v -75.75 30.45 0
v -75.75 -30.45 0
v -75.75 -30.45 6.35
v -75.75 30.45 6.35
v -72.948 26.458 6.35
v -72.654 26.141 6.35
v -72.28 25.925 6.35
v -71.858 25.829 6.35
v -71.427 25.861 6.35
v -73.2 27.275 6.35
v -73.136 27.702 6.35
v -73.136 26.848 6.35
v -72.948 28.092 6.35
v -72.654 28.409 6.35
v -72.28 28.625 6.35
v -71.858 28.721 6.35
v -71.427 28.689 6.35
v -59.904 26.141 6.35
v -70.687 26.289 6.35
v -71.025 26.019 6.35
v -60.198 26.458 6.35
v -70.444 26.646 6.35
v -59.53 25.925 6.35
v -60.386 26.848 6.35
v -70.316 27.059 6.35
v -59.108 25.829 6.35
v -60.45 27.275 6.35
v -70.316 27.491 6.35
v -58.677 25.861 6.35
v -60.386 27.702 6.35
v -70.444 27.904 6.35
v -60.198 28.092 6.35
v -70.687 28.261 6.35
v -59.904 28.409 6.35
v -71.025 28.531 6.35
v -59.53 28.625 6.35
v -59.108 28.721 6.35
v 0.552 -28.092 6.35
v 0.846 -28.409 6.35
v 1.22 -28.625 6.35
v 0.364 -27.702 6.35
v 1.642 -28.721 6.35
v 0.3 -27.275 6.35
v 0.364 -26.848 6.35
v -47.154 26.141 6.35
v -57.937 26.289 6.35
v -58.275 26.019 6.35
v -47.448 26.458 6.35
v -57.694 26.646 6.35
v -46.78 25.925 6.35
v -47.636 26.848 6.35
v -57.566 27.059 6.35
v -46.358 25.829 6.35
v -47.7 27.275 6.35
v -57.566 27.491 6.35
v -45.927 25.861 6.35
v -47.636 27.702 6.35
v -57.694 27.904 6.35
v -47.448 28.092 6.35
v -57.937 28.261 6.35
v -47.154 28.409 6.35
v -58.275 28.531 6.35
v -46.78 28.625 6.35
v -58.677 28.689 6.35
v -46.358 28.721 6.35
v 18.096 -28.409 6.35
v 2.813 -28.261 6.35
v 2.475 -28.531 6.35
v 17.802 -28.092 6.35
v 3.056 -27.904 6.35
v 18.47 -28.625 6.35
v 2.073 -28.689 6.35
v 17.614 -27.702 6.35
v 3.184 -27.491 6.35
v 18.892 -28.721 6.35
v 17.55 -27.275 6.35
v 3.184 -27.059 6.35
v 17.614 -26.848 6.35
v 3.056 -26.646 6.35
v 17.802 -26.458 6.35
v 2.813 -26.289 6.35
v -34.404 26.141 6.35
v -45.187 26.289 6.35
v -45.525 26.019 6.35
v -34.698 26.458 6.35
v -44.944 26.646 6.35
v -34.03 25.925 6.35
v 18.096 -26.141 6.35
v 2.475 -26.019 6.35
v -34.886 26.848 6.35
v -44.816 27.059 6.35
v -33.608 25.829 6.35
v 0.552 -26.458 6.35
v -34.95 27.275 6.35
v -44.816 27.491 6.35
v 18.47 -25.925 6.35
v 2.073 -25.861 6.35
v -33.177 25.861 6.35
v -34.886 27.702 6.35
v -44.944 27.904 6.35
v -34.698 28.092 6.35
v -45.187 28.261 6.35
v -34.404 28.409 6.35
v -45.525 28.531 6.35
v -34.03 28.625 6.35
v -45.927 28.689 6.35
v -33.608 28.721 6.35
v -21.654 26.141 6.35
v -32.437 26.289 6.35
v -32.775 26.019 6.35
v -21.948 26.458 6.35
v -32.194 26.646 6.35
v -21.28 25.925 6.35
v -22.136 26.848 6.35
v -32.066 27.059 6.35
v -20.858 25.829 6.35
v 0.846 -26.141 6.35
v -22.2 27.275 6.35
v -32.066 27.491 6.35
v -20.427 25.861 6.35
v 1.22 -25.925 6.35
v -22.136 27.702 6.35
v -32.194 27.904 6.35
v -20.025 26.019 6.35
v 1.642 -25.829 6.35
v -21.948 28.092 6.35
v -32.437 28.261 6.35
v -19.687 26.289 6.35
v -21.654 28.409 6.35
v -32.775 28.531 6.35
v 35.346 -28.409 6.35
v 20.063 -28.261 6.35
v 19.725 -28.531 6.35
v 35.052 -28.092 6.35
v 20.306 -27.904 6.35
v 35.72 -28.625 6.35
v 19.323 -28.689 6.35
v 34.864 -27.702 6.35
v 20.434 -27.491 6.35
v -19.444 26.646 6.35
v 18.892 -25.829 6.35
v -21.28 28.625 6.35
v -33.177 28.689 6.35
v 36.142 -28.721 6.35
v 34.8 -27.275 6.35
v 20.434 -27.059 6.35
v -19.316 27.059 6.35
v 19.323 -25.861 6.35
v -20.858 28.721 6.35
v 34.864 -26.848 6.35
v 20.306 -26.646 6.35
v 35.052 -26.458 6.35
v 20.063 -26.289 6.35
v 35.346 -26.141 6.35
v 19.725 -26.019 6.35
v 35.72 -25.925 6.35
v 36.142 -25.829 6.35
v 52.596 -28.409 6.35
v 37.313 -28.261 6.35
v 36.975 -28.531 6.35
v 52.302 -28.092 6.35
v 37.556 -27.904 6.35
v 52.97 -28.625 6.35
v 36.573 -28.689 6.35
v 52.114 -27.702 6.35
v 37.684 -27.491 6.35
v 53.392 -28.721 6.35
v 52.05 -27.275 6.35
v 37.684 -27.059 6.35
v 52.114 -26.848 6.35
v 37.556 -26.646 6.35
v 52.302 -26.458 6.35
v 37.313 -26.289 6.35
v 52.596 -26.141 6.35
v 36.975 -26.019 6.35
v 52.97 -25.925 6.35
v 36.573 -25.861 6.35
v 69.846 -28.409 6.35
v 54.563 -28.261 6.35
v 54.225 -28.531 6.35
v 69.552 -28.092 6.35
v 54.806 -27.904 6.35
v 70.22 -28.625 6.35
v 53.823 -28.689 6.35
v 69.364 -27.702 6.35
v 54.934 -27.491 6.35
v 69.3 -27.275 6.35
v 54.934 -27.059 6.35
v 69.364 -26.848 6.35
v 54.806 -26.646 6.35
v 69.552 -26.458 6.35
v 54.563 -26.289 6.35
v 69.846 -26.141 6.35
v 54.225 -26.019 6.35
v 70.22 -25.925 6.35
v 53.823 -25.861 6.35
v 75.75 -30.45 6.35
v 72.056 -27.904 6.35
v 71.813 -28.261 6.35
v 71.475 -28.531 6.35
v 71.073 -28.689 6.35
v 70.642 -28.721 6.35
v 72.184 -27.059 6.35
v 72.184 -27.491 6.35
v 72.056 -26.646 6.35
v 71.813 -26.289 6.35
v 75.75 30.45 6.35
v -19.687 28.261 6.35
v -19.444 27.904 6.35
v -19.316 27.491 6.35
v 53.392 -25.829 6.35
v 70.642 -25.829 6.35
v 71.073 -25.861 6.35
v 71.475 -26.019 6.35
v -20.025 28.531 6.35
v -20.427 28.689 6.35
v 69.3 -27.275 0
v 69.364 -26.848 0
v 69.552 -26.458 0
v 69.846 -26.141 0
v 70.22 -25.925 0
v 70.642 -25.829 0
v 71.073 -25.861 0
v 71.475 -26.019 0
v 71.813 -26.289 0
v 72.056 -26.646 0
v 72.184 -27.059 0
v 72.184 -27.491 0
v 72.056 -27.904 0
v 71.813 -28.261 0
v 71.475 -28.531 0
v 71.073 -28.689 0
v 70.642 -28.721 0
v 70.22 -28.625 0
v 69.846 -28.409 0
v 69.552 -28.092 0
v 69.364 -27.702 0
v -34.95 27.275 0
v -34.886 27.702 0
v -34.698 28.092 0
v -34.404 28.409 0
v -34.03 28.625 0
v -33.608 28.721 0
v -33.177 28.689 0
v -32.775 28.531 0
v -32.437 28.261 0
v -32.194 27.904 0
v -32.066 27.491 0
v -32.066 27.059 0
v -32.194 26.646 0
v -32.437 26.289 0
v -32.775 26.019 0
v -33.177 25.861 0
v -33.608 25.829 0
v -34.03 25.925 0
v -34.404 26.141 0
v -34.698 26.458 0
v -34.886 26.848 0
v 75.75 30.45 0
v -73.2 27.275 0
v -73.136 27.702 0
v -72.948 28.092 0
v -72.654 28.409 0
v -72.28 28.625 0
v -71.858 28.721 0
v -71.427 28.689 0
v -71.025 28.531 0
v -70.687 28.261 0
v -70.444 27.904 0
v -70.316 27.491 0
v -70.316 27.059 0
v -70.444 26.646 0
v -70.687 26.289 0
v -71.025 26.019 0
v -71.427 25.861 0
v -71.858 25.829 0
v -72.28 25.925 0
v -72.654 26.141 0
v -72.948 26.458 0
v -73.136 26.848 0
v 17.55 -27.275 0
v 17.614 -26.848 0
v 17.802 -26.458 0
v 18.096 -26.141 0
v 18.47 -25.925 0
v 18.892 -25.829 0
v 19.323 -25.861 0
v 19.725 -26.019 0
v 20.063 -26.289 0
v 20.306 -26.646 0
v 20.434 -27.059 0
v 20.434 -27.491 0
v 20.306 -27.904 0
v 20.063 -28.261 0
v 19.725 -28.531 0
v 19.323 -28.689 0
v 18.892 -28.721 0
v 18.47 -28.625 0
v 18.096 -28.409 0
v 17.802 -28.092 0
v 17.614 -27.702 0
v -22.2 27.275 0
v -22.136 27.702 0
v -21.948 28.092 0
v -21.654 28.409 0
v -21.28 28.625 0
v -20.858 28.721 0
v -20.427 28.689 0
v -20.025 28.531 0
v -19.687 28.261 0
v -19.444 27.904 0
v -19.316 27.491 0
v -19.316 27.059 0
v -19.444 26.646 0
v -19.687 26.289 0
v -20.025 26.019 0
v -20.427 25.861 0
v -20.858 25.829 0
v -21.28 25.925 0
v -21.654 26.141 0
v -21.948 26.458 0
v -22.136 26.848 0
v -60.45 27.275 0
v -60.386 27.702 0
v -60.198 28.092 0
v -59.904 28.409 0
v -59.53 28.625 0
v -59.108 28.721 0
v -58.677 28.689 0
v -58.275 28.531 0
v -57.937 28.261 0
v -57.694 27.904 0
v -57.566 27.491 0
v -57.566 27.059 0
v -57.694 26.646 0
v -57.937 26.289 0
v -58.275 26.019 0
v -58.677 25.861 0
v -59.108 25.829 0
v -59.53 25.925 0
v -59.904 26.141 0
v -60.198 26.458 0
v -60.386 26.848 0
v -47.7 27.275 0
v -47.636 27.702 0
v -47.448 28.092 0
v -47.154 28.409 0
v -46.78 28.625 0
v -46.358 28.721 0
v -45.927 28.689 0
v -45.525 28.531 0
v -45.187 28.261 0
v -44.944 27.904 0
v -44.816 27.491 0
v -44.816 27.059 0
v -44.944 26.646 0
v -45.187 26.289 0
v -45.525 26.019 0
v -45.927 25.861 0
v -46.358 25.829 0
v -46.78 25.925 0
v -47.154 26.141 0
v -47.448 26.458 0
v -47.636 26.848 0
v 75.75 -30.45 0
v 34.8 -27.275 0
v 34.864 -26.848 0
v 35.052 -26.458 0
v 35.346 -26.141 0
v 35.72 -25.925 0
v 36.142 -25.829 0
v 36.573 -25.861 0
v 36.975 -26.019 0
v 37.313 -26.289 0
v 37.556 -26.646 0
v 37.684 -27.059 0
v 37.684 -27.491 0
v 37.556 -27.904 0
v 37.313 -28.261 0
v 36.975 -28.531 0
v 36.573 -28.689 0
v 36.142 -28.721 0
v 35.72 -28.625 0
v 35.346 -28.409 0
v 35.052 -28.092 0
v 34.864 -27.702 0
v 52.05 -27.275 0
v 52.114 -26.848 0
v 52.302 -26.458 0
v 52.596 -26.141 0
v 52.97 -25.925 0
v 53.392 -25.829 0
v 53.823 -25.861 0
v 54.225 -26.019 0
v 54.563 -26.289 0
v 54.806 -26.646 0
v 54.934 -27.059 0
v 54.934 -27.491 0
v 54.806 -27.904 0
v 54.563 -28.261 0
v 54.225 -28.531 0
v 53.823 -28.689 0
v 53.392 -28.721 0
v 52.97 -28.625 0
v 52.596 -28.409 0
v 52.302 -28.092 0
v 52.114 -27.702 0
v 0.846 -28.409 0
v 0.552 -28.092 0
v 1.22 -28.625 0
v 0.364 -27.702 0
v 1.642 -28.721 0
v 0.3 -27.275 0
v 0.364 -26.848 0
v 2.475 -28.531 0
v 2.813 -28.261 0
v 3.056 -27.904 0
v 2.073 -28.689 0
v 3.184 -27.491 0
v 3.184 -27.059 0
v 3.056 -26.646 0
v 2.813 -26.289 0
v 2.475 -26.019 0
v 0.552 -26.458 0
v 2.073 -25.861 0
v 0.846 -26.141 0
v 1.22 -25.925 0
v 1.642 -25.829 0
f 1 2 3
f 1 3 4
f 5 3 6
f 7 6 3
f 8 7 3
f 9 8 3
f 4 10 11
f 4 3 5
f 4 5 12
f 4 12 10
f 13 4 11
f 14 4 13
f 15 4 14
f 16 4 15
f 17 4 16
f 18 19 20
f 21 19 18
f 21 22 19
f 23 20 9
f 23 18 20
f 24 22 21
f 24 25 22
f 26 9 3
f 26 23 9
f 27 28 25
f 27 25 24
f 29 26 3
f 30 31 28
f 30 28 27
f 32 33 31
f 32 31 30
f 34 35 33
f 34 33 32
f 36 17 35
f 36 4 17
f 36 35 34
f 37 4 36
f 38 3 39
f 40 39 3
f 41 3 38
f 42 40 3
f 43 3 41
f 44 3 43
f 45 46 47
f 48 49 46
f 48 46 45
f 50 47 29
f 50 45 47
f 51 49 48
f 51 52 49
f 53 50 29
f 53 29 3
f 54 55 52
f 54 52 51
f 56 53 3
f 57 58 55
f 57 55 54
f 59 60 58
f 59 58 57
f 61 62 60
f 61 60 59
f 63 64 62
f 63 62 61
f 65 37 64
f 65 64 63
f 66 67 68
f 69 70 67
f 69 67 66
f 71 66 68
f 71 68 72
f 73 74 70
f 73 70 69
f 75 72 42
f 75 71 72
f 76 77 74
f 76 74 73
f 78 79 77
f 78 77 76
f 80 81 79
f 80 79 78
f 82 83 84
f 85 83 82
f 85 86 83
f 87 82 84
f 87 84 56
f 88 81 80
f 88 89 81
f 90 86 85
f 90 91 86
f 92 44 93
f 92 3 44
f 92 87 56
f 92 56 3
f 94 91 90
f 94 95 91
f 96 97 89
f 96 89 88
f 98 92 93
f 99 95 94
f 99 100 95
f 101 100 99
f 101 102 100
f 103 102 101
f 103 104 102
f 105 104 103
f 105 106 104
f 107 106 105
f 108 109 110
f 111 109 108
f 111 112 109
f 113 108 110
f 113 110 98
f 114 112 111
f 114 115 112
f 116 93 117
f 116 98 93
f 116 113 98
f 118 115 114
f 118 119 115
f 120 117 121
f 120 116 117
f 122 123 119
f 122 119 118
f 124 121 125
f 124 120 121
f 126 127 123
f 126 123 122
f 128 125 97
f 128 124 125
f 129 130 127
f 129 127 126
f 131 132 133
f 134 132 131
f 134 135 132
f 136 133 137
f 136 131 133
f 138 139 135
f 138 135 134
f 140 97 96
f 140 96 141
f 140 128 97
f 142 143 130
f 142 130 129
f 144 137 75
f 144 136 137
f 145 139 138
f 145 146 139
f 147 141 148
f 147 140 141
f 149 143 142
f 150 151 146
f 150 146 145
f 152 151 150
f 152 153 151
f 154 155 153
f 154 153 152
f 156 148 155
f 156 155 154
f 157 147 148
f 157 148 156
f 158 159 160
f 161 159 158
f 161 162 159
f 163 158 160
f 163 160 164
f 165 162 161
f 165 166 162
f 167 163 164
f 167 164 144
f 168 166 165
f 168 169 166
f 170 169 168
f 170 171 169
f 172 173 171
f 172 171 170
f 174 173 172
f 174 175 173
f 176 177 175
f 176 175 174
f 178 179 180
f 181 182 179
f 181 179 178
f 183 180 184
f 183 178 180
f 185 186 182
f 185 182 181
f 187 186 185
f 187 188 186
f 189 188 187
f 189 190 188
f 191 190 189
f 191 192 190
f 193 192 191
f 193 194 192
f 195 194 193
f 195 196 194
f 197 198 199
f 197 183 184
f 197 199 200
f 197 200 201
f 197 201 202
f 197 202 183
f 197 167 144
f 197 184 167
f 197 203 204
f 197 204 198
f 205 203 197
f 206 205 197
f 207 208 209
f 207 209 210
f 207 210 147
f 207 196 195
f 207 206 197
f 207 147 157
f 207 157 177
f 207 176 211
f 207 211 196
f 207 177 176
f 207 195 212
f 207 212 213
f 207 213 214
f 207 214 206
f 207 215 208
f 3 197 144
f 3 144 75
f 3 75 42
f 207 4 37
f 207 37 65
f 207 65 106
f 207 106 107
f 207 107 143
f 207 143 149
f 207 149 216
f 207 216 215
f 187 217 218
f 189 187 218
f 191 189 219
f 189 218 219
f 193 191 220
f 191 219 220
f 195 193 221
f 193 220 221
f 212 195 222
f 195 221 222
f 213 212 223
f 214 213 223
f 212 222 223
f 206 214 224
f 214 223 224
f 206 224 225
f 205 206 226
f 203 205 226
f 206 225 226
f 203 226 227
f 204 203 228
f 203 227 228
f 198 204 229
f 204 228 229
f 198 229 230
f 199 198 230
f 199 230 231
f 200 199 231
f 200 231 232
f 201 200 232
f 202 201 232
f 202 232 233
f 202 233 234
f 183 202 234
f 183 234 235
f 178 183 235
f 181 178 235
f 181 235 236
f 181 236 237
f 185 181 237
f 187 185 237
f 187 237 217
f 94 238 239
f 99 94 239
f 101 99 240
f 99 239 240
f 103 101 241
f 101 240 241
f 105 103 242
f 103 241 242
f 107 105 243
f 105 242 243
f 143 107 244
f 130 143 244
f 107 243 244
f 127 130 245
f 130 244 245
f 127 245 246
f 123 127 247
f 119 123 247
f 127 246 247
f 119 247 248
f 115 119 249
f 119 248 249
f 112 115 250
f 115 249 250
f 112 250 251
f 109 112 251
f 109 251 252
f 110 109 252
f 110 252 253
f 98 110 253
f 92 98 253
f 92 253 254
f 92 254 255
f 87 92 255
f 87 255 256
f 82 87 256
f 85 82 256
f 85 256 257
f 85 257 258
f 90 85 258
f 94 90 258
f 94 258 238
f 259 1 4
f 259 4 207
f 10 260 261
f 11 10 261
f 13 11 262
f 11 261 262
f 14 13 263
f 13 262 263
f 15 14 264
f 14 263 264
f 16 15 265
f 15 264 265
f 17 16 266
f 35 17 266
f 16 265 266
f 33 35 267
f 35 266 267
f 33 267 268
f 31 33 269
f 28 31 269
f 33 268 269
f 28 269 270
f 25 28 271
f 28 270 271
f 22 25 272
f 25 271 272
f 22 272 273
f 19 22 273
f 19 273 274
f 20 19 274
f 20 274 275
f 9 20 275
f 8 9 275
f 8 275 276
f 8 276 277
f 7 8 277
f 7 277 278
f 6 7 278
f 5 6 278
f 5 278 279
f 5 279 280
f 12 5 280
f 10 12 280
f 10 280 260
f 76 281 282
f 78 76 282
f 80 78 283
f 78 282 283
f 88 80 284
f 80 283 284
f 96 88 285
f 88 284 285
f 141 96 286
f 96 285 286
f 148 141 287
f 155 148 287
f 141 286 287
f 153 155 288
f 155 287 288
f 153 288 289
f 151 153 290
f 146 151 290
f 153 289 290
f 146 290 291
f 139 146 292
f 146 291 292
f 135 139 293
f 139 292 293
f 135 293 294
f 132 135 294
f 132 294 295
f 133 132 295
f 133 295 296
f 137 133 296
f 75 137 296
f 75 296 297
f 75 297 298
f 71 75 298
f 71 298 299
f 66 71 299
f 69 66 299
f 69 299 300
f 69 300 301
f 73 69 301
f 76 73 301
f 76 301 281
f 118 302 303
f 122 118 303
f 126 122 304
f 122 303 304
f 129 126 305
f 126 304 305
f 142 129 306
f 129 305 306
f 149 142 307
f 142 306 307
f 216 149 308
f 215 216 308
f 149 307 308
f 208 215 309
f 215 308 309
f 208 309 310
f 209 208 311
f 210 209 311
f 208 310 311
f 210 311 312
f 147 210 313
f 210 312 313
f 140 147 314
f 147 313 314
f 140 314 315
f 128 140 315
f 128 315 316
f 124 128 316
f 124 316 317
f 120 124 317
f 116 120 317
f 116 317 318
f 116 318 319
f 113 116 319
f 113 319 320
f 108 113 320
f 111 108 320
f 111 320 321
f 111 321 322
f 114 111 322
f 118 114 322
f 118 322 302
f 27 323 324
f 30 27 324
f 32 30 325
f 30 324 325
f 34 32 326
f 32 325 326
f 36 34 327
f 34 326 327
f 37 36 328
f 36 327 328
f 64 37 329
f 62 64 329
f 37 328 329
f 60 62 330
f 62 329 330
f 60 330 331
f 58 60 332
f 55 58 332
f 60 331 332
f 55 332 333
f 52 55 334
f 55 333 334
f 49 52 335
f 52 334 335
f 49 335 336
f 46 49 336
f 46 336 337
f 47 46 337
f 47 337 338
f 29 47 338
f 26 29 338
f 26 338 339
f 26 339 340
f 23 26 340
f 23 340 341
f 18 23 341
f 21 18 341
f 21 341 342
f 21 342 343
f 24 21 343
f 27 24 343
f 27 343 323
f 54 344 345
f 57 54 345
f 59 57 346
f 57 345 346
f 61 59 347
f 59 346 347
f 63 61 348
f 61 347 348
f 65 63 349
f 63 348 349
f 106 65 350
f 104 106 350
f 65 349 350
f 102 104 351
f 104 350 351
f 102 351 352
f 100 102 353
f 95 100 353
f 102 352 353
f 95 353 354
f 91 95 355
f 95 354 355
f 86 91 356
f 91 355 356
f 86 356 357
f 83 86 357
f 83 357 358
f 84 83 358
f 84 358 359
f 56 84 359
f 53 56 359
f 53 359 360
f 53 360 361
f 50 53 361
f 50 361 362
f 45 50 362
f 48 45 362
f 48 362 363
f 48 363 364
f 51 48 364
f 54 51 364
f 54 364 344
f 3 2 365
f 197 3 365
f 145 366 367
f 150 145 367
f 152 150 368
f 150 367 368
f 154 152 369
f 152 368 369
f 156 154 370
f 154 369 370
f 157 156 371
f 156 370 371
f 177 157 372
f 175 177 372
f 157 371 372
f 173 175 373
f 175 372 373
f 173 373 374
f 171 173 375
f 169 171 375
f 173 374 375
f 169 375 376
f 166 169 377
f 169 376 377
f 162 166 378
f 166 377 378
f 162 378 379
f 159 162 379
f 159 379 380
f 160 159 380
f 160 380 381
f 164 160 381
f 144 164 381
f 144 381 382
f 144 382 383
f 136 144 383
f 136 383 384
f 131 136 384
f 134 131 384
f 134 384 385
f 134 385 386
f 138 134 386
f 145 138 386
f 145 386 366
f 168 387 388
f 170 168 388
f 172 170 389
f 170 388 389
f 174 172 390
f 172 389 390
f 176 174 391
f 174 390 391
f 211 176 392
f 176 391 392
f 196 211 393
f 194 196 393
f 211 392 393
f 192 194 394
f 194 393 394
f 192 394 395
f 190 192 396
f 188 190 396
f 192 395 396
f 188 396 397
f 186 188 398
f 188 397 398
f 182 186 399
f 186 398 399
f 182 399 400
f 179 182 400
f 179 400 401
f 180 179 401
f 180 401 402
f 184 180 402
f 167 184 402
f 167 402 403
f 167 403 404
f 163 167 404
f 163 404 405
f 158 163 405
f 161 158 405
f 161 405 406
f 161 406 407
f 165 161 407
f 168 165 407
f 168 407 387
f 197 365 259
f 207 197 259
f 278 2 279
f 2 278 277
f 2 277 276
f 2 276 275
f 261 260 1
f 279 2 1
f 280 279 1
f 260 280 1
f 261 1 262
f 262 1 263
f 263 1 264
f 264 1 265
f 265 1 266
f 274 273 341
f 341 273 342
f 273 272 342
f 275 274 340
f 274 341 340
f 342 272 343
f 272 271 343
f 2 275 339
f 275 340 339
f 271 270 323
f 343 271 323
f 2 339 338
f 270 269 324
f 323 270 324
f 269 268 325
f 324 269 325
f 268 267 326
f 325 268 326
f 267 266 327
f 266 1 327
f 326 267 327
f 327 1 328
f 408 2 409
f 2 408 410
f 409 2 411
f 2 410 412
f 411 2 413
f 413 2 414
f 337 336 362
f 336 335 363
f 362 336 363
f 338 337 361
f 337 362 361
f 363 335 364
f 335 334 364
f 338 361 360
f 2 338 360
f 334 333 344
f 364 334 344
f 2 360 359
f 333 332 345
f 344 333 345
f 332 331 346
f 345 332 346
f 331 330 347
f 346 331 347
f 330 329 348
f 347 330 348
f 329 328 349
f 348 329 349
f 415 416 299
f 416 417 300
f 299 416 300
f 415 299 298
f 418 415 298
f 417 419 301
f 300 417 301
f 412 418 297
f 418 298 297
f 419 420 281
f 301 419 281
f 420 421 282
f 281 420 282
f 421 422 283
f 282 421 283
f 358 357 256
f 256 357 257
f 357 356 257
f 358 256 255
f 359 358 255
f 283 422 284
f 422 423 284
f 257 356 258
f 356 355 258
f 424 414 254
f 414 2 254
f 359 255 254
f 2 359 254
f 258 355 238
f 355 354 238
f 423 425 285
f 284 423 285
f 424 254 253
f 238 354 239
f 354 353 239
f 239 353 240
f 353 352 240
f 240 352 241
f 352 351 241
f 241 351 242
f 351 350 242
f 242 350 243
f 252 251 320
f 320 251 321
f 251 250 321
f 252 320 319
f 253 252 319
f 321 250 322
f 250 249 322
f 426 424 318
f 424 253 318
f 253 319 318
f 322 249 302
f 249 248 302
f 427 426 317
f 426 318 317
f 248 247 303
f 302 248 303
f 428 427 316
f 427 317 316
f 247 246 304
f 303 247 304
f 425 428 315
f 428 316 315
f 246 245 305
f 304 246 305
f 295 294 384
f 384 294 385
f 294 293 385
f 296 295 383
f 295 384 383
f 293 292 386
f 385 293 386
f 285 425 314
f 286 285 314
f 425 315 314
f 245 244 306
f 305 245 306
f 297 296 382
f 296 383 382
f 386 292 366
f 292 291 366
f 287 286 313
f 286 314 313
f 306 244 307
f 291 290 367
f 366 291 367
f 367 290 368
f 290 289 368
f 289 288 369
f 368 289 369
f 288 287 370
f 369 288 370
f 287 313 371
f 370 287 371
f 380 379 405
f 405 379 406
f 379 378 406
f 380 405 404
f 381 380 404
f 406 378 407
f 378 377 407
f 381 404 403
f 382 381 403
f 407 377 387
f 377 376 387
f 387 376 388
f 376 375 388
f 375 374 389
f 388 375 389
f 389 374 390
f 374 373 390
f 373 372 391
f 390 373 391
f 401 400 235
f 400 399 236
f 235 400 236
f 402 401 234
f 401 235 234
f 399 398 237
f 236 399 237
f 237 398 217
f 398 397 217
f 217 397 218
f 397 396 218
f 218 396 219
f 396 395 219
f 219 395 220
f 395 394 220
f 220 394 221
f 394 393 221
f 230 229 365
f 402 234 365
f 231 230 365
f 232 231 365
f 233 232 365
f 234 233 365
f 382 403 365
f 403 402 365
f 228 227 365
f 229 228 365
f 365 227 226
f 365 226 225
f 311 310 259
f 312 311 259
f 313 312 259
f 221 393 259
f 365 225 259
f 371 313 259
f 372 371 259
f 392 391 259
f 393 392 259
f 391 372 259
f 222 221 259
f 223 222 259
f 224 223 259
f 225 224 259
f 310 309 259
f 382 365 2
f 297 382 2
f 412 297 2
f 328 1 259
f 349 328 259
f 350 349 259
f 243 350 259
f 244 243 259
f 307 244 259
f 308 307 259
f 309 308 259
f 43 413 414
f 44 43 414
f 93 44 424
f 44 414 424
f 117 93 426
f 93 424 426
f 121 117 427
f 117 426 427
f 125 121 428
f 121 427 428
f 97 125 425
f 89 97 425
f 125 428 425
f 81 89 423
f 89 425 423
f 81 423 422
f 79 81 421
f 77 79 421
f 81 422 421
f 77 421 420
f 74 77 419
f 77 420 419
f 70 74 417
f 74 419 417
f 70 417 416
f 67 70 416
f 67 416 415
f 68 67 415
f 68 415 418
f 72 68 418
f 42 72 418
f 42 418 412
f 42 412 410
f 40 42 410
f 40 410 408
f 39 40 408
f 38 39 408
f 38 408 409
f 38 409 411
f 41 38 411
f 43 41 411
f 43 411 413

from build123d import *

# Parameters (mm, degrees)
SKETCH1_W              = 151.500000022
SKETCH1_H              = 60.9
BOSS_EXTRUDE1_DEPTH    = 6.35
M2_5_CLEARANCE_HOLE1_D = 2.9


with BuildPart() as part:
    # Sketch1 → Boss-Extrude1 (new body)
    with BuildSketch(Plane.XY):
        Rectangle(SKETCH1_W, SKETCH1_H)
    extrude(amount=BOSS_EXTRUDE1_DEPTH)

    # M2.5 Clearance Hole1 (through all)
    with Locations(Plane.XY.offset(6.35)):
        with Locations((-71.750000011, 27.275), (-59.000000011, 27.275), (-46.250000011, 27.275), (-33.500000011, 27.275), (-20.750000011, 27.275), (1.750001156, -27.275), (19.000000864, -27.275), (36.250000573, -27.275), (53.500000281, -27.275), (70.749999989, -27.275)):
            Hole(M2_5_CLEARANCE_HOLE1_D / 2)


solid = part.part
